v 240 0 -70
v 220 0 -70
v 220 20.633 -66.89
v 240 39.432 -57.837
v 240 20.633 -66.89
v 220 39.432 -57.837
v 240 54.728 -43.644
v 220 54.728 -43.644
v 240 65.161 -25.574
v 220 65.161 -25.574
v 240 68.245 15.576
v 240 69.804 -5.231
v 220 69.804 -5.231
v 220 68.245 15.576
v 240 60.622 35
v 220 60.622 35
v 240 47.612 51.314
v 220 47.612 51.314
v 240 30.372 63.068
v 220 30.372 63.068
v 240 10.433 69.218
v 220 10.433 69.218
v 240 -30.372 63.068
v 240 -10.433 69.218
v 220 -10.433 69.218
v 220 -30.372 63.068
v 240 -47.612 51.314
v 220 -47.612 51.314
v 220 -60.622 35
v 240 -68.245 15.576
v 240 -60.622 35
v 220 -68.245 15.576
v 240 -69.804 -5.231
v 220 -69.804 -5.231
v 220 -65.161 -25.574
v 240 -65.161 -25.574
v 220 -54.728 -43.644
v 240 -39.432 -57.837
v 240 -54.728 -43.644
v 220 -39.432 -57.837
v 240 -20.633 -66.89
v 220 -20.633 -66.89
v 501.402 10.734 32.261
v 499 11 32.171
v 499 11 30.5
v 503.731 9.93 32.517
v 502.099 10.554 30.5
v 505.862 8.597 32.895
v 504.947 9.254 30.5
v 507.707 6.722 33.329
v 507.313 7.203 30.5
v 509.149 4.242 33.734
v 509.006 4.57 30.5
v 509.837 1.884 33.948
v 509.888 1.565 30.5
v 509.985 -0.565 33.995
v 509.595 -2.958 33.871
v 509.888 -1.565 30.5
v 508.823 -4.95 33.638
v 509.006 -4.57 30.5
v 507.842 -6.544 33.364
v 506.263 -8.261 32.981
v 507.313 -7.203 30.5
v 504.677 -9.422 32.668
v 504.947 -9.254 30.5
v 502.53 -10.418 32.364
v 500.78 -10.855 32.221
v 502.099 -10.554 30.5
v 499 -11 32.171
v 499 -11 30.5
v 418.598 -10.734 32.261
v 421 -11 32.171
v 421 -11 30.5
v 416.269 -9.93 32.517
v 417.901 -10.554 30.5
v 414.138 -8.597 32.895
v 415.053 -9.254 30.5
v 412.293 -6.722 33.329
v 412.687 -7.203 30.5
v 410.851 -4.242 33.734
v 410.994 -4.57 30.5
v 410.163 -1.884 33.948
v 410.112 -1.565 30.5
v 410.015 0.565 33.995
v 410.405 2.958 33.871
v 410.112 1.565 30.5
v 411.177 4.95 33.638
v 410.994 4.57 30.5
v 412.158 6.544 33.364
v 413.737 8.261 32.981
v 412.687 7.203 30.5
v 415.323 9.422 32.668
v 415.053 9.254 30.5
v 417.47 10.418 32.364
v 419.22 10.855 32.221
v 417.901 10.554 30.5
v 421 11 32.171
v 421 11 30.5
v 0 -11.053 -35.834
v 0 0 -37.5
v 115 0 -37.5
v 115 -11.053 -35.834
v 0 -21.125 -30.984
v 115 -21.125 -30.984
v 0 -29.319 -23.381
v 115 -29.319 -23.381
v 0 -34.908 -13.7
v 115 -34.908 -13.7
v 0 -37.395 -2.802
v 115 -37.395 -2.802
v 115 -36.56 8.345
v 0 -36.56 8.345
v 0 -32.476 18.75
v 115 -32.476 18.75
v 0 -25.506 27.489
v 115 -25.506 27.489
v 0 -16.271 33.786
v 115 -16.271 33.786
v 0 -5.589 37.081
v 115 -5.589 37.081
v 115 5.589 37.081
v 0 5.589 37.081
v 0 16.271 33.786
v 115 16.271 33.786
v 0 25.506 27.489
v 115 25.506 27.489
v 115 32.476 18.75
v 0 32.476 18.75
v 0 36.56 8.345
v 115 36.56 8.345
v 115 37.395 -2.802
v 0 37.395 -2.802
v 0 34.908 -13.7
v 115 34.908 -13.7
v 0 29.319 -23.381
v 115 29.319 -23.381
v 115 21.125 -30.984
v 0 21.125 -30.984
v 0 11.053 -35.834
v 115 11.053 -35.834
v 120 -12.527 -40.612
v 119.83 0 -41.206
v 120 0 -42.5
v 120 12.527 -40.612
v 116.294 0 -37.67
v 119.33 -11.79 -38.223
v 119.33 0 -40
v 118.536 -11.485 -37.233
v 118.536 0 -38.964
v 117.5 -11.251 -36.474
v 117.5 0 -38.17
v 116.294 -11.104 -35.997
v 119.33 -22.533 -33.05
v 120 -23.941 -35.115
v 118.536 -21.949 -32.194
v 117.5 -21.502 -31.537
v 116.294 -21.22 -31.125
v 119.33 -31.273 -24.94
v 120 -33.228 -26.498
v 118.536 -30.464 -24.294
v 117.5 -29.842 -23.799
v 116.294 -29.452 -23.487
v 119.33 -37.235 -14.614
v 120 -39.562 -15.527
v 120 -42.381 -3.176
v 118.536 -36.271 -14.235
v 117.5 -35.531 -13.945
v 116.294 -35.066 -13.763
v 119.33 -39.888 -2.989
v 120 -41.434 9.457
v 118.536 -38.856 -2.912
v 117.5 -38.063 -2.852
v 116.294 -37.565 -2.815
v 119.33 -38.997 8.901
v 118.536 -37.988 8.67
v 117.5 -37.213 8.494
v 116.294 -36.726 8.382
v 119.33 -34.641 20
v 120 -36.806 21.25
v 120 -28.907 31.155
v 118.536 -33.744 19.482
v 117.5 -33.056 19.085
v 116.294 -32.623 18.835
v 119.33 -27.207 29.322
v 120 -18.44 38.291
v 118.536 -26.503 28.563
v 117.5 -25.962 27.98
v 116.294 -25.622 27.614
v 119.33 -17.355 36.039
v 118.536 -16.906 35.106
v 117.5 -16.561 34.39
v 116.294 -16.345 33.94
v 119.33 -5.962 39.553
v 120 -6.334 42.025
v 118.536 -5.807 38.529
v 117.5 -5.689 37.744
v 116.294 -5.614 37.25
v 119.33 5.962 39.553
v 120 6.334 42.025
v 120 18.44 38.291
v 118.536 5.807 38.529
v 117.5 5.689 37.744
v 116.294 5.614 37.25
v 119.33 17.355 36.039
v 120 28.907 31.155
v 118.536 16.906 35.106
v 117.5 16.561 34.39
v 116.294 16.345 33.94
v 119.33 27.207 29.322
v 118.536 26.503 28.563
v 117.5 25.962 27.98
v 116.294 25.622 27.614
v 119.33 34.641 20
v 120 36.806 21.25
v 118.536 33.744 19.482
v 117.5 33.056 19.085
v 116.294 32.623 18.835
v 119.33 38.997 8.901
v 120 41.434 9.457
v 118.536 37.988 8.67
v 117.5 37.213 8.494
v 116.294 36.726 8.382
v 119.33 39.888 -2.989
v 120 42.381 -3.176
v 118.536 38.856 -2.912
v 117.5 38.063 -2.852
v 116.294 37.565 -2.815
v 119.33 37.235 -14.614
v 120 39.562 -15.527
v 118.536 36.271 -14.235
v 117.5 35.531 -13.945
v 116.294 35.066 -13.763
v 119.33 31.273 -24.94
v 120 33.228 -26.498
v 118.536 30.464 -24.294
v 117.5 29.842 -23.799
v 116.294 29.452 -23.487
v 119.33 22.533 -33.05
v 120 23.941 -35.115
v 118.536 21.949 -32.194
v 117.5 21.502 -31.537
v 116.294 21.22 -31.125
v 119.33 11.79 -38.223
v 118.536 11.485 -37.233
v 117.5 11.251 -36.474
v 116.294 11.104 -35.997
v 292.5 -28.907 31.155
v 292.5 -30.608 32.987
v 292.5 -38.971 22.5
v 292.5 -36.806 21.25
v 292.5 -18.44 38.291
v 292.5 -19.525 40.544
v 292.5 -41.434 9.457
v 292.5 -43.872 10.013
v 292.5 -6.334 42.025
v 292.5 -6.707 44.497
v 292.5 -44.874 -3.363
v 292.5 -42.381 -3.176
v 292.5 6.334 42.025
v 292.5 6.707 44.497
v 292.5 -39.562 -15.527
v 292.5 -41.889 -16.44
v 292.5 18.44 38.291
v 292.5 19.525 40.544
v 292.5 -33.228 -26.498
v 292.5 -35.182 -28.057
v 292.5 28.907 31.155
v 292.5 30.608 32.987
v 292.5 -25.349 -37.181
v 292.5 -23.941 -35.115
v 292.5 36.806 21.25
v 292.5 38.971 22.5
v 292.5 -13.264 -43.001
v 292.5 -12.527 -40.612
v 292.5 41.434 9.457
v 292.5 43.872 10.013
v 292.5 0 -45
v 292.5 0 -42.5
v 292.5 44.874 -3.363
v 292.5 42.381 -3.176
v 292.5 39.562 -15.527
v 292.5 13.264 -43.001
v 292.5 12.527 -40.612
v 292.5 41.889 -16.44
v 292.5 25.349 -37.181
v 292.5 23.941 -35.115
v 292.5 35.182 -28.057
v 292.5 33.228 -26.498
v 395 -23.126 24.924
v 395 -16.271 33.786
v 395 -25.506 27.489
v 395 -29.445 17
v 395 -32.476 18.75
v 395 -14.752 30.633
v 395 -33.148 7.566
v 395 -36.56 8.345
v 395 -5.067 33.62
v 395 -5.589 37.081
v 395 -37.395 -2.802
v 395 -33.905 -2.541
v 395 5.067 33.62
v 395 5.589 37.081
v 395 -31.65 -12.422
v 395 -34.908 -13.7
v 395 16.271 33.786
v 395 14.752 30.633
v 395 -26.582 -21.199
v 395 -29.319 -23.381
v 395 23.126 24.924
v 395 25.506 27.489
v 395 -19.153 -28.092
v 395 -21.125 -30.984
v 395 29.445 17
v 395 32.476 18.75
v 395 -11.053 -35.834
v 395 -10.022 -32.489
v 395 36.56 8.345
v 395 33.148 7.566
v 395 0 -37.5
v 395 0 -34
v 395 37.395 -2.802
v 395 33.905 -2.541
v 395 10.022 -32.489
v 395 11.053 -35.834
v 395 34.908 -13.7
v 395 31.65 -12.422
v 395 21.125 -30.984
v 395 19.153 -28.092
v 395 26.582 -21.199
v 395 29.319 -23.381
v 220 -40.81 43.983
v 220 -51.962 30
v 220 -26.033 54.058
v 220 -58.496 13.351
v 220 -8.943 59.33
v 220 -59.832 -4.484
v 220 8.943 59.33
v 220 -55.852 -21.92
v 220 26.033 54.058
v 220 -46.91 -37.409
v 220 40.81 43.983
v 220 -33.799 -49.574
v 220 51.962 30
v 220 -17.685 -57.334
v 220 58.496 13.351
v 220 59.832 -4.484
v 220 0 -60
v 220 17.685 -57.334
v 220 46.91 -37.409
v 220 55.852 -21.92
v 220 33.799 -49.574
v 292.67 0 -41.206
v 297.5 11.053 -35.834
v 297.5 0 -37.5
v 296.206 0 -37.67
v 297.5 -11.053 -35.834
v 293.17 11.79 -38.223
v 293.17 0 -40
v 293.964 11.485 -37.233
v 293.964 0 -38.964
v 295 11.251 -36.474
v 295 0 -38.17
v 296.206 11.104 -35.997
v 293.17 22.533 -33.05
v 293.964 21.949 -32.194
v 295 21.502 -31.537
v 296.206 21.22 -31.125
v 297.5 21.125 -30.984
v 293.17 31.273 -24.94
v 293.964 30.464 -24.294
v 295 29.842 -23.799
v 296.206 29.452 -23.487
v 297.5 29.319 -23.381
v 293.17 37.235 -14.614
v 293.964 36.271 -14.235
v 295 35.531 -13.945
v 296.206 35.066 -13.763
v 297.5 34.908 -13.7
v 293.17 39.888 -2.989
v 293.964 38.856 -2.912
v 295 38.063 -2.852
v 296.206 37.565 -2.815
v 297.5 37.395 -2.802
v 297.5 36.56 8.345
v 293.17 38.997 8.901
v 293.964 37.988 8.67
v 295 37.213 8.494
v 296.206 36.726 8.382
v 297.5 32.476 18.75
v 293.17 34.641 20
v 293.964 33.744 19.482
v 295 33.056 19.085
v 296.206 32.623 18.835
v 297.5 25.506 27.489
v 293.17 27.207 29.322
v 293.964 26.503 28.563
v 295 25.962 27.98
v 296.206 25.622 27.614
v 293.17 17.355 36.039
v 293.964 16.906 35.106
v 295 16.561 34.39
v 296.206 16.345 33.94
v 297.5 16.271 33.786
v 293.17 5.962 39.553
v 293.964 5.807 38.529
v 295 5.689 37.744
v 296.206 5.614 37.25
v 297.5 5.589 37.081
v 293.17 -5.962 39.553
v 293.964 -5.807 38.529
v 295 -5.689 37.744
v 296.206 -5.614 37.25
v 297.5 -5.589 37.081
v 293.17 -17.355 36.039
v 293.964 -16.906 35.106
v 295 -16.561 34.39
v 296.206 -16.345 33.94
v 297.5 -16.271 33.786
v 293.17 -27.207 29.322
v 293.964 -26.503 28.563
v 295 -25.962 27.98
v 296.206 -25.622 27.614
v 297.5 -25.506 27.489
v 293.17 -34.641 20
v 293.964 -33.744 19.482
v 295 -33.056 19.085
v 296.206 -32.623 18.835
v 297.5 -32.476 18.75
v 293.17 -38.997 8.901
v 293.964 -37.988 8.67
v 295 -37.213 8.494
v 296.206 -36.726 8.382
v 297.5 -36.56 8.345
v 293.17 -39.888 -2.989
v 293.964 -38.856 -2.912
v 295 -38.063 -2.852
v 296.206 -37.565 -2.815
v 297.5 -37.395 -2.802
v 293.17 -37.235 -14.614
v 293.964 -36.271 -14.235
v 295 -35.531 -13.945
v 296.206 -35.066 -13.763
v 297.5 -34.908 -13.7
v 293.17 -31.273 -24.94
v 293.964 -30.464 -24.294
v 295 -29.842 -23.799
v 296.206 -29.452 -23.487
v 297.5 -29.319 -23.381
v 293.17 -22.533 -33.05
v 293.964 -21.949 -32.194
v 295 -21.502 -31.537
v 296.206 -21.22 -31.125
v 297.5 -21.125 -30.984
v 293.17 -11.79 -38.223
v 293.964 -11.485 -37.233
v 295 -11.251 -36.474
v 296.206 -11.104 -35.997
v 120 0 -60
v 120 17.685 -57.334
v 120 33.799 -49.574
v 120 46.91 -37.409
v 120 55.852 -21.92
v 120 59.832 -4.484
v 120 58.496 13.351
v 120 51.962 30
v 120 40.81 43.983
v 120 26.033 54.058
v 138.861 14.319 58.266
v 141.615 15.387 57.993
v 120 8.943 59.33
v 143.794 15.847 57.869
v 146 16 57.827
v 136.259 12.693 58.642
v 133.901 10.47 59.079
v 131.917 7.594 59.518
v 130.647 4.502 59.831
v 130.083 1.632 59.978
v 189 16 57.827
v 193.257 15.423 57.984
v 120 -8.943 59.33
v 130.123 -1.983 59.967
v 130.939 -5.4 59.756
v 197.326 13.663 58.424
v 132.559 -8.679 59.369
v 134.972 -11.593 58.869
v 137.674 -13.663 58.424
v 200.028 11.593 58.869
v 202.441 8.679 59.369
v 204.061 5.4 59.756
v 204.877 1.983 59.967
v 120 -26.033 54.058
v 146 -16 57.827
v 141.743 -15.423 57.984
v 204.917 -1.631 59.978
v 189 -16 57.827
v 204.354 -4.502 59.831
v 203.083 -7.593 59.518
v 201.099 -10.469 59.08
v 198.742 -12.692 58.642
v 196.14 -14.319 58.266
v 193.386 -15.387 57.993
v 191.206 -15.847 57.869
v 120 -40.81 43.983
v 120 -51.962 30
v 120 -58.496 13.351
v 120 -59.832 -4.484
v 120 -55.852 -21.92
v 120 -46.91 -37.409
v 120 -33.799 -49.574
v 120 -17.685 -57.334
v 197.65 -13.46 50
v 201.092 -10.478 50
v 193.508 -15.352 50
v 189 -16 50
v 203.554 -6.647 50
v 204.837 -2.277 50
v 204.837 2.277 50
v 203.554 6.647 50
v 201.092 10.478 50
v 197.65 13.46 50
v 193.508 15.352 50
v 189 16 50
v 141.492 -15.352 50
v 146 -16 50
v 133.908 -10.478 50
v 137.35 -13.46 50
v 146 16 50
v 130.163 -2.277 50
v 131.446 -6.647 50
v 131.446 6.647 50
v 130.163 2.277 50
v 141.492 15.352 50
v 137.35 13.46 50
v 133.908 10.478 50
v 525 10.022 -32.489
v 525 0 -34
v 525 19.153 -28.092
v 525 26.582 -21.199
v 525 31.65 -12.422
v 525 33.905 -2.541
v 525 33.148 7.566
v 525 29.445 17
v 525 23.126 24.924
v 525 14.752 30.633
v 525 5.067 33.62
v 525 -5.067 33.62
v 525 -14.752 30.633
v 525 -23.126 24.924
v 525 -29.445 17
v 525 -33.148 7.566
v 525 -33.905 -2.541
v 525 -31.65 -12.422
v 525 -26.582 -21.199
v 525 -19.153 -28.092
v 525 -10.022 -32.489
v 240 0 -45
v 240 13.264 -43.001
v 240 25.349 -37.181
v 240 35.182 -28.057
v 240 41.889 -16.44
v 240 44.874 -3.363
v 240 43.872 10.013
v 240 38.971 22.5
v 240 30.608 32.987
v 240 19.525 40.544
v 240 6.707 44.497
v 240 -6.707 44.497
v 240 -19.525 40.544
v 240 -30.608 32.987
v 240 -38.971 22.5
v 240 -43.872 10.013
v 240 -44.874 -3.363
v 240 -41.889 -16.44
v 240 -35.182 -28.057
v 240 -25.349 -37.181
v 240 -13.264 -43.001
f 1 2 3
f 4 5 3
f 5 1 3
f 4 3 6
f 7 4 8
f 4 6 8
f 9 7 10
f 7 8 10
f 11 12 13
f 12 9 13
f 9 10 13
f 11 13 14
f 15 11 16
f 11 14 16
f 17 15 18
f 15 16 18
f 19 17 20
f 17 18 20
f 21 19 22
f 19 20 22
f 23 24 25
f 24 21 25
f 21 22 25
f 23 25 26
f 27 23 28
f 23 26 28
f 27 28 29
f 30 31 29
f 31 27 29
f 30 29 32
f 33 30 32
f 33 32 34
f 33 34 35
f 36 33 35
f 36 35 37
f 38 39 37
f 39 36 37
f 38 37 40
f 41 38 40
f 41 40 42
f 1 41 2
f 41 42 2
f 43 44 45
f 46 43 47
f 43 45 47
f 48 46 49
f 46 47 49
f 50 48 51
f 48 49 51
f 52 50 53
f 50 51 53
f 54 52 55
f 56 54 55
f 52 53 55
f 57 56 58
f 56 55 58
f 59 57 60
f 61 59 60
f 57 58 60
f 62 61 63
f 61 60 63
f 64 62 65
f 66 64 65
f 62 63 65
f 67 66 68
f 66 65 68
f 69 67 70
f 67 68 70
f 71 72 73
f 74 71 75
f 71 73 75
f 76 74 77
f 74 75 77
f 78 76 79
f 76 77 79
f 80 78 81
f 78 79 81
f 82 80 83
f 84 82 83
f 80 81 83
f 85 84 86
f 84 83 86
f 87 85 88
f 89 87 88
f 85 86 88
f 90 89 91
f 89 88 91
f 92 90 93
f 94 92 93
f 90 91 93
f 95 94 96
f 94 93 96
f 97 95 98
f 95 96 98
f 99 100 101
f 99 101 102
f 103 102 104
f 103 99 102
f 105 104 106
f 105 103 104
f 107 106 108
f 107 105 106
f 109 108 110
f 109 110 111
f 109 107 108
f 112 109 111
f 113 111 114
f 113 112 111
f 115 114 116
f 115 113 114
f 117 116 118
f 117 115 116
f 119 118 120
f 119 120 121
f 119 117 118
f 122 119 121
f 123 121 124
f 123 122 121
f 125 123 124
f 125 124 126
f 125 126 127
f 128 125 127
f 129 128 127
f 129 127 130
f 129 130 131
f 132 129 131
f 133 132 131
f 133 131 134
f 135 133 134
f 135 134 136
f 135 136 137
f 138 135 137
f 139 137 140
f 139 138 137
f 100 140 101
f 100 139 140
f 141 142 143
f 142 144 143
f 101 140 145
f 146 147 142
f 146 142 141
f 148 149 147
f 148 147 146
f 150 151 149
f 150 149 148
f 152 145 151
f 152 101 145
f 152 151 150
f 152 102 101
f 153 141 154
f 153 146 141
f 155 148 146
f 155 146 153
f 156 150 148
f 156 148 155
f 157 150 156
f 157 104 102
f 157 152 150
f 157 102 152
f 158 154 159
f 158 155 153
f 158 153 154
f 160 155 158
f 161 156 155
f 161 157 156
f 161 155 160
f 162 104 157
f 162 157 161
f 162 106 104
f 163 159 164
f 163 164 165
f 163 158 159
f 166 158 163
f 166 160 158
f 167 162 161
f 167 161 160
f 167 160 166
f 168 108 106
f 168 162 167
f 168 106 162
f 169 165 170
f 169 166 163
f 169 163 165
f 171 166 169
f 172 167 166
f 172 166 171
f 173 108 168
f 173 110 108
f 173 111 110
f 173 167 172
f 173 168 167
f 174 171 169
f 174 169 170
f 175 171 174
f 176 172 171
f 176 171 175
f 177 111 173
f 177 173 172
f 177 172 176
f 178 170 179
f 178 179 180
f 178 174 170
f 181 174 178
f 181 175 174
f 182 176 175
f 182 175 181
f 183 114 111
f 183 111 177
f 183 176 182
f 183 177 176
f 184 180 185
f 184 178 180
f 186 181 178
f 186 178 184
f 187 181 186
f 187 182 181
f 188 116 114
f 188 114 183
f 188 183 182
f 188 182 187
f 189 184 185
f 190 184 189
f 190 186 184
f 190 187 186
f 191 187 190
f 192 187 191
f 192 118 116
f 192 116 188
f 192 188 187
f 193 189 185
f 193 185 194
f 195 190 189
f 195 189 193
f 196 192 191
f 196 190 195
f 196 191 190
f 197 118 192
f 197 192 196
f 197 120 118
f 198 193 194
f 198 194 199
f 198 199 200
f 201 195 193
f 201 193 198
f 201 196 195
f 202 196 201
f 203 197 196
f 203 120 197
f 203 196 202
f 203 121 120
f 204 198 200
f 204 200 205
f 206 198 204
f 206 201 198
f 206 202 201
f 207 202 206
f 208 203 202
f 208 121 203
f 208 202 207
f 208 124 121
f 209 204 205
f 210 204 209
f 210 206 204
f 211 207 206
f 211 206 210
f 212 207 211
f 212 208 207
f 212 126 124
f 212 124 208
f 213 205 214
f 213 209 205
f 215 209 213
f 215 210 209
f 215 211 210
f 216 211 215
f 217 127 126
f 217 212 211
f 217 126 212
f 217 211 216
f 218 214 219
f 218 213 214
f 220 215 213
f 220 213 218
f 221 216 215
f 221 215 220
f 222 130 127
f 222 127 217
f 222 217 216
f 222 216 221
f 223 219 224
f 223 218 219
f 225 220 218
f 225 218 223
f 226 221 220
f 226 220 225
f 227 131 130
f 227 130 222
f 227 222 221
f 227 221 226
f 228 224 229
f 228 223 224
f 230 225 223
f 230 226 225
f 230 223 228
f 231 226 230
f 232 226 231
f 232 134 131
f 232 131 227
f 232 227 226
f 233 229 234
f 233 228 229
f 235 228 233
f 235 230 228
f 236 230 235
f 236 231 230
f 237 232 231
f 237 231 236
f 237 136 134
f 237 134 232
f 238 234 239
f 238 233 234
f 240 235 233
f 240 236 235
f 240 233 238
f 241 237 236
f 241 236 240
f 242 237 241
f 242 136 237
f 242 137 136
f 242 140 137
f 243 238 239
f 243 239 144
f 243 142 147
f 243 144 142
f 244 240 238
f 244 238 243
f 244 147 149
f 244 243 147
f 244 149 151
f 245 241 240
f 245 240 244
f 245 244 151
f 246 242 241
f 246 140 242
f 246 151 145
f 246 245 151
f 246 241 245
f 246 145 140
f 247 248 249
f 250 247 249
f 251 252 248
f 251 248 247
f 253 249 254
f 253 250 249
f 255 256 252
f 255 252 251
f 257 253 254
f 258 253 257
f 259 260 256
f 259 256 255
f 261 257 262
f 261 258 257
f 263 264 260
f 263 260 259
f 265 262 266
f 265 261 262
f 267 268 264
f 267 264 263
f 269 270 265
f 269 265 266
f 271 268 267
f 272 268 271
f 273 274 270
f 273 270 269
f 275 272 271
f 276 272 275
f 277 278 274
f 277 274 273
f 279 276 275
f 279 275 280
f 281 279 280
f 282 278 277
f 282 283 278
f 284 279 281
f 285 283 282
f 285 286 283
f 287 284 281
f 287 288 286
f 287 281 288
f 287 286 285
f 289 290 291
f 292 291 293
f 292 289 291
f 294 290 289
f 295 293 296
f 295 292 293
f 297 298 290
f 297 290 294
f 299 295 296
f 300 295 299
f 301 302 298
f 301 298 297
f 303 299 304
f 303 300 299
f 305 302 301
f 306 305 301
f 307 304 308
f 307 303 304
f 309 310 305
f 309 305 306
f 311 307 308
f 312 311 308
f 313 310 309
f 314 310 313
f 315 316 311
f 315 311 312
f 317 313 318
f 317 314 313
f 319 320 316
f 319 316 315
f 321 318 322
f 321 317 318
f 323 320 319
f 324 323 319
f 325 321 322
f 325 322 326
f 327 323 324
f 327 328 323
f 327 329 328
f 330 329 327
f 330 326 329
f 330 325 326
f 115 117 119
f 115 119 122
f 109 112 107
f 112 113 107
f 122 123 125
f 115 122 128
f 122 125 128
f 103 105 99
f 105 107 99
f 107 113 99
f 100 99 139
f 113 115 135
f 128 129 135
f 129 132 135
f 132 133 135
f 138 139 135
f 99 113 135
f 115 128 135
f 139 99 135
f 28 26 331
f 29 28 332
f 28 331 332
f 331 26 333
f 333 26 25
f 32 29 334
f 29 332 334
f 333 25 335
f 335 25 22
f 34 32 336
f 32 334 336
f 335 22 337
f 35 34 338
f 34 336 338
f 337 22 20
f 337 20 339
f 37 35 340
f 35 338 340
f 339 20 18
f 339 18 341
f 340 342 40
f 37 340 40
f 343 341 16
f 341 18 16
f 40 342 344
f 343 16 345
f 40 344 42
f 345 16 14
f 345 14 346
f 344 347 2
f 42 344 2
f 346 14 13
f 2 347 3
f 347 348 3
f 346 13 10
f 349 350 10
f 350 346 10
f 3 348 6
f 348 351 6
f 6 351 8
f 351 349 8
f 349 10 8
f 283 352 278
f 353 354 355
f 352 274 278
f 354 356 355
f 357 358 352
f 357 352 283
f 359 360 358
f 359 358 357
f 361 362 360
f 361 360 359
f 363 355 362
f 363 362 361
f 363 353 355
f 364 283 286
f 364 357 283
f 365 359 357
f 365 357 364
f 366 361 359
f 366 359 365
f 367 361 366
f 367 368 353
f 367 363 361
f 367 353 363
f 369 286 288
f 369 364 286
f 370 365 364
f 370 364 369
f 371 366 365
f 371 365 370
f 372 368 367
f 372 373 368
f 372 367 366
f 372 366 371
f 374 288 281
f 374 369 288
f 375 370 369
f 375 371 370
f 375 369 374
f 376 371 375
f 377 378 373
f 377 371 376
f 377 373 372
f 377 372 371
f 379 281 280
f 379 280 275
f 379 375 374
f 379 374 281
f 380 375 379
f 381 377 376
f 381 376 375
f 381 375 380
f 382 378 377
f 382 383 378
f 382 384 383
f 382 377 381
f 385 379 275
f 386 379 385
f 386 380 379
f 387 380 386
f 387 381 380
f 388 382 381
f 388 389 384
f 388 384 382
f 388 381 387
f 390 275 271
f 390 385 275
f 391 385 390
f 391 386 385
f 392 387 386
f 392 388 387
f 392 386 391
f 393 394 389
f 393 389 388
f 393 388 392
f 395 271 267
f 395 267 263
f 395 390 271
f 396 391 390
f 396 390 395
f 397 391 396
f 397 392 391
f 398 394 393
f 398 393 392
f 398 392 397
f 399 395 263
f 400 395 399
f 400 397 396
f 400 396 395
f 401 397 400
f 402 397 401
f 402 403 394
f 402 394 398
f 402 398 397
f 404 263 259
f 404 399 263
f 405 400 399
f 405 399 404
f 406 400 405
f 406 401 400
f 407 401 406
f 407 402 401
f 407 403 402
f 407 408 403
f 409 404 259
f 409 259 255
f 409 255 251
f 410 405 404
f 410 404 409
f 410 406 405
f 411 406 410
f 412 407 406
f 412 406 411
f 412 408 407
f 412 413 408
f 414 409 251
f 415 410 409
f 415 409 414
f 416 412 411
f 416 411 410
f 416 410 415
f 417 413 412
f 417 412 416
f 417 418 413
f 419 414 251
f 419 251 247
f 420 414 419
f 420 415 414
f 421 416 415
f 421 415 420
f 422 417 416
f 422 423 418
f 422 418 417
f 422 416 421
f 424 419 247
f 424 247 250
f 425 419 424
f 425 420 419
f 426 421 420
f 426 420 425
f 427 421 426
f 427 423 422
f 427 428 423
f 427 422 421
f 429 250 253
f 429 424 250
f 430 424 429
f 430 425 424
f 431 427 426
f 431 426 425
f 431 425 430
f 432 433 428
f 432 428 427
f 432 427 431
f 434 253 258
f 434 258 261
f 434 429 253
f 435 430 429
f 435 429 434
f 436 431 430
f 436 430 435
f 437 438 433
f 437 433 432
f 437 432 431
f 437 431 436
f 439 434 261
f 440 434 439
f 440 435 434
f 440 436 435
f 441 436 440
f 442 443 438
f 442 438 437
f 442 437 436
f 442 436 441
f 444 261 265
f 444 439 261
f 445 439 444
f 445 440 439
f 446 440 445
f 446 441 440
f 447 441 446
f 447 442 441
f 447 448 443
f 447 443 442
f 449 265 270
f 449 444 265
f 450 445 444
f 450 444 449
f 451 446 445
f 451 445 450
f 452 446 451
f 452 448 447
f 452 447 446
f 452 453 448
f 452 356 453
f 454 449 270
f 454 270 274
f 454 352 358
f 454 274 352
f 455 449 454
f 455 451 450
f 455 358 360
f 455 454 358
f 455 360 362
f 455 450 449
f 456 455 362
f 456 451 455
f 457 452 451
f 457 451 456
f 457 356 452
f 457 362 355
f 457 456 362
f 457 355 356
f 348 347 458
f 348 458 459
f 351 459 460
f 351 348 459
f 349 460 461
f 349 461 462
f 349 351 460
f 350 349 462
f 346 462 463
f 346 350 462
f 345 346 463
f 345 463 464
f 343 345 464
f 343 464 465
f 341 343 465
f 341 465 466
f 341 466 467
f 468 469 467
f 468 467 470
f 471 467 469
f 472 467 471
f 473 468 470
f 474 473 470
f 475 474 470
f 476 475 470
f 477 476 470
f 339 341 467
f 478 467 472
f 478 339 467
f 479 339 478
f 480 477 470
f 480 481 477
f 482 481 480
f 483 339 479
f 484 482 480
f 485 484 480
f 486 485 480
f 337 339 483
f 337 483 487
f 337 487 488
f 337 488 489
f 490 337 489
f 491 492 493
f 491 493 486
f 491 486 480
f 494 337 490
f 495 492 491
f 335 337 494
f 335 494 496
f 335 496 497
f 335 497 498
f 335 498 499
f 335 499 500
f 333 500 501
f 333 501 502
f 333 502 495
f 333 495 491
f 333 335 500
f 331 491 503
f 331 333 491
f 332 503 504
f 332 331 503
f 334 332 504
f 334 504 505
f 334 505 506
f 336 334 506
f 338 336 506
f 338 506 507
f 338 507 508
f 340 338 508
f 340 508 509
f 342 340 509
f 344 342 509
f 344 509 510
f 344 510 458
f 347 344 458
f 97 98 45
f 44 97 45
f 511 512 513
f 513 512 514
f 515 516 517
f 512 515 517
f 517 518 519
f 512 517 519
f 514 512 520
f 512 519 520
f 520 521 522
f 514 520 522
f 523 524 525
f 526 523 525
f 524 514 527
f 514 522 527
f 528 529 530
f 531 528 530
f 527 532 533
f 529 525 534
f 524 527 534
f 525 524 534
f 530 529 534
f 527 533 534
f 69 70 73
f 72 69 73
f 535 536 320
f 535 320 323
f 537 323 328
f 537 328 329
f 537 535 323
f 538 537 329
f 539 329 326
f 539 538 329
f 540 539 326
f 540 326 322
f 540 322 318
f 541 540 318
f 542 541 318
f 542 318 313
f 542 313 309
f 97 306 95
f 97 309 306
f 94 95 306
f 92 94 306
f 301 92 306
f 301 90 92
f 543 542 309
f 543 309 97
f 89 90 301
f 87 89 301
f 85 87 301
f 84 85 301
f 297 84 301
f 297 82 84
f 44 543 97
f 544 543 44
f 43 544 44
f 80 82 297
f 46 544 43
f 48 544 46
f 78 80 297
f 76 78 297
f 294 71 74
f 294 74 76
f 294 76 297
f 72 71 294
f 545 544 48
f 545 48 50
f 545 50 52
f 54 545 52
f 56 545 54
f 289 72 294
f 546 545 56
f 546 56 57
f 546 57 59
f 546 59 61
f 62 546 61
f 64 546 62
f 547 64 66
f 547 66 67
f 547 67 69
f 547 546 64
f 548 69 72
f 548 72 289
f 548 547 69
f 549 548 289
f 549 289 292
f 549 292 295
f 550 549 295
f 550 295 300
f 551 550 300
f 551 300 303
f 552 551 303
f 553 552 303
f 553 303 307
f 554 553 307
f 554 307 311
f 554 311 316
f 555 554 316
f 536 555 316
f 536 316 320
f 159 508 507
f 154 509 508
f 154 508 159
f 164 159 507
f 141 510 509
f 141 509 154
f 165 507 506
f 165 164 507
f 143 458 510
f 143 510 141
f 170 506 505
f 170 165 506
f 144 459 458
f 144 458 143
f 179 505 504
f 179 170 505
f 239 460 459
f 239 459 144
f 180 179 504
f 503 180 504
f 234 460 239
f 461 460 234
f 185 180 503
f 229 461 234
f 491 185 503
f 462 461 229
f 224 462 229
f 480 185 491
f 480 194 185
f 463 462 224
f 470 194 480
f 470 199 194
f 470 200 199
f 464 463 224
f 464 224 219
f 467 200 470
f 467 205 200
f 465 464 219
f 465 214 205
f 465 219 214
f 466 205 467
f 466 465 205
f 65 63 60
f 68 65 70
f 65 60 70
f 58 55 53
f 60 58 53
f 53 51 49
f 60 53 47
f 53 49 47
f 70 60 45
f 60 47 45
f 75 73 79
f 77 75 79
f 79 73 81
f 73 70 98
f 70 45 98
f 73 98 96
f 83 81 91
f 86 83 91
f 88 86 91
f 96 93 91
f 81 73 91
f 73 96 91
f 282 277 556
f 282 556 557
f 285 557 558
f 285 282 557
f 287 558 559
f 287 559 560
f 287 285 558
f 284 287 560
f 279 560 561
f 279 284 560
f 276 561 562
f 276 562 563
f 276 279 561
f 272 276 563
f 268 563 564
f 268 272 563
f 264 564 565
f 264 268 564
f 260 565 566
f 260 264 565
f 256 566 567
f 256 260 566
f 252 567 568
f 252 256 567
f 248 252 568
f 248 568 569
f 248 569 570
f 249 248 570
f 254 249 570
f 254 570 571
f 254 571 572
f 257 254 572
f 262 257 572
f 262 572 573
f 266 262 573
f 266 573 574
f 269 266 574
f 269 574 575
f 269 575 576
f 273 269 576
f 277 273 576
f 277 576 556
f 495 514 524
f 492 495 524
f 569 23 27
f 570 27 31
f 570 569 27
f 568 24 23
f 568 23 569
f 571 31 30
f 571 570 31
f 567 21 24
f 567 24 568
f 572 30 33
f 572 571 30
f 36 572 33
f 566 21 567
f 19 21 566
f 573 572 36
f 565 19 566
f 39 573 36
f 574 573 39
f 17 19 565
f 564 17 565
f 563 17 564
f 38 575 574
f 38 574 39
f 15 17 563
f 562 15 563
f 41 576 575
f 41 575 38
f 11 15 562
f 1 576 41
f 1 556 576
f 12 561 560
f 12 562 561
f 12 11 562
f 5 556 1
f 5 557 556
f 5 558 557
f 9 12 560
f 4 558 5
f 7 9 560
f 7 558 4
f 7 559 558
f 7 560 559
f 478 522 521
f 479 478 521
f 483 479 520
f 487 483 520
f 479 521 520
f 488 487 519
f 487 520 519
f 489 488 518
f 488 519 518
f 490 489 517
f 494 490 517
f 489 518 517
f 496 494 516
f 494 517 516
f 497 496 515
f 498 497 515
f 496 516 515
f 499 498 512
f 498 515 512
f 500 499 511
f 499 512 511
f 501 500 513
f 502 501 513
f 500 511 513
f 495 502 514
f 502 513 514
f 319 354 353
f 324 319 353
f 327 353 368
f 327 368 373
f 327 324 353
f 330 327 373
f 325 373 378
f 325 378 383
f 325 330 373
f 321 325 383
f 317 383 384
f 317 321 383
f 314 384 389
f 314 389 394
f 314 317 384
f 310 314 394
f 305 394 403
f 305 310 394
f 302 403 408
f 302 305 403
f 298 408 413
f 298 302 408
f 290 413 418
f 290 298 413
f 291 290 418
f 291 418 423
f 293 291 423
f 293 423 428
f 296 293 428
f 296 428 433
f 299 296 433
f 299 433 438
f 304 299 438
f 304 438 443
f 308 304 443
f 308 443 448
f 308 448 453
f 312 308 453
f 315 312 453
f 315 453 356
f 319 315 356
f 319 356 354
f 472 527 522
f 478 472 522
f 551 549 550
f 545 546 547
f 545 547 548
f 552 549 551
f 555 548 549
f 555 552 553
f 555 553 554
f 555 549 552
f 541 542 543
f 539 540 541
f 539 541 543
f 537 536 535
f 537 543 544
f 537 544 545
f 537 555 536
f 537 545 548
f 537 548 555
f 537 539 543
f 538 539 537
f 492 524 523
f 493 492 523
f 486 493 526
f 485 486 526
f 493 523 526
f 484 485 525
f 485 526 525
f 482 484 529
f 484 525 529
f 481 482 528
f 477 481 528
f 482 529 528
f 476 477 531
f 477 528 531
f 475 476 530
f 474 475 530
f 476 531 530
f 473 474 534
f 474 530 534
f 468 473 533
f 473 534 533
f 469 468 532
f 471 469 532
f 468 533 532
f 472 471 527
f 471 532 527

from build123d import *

# Parameters (mm, degrees)
SKETCH_1_R          = 70
EXTRUDE_1_DEPTH     = 525
SKETCH_2_OUTSIDE_W  = 254.218
SKETCH_2_OUTSIDE_H  = 254.218
SKETCH_2_OUTSIDE_R  = 45
CUT_EXTRUDE_2_DEPTH = 285
CUT_EXTRUDE_START   = -20
SKETCH_3_OUTSIDE_W  = 254.218
SKETCH_3_OUTSIDE_H  = 254.218
SKETCH_3_OUTSIDE_R  = 60
CUT_EXTRUDE_3_DEPTH = 282.703496831
SKETCH_4_OUTSIDE_W  = 254.218
SKETCH_4_OUTSIDE_H  = 254.218
SKETCH_4_OUTSIDE_R  = 37.5
CUT_EXTRUDE_4_DEPTH = 232.5
SKETCH_5_OUTSIDE_W  = 254.218
SKETCH_5_OUTSIDE_H  = 254.218
SKETCH_5_OUTSIDE_R  = 37.5
CUT_EXTRUDE_5_DEPTH = 120
CUT_EXTRUDE_START_2 = 50
CUT_EXTRUDE_6_DEPTH = 485.251813287
SKETCH_8_OUTSIDE_W  = 254.218
SKETCH_8_OUTSIDE_H  = 254.218
SKETCH_8_OUTSIDE_R  = 34
CUT_EXTRUDE_1_DEPTH = 130
CUT_EXTRUDE_START_3 = 30.5
CUT_EXTRUDE_7_DEPTH = 504.751813287
FILLET_1_R          = 5


with BuildPart() as part:
    # 草图1 → 拉伸1 (new body)
    with BuildSketch(Plane(origin=(0, 0, 0), x_dir=(0, 0, -1), z_dir=(1, 0, 0))):
        Circle(SKETCH_1_R)
    extrude(amount=EXTRUDE_1_DEPTH)

    # 草图2 outside → 拉伸2 (cut)
    with BuildSketch(Plane(origin=(525, 0, 0), x_dir=(0, 0, -1), z_dir=(1, 0, 0))):
        Rectangle(SKETCH_2_OUTSIDE_W, SKETCH_2_OUTSIDE_H)
        Circle(SKETCH_2_OUTSIDE_R, mode=Mode.SUBTRACT)
    extrude(amount=-CUT_EXTRUDE_2_DEPTH, mode=Mode.SUBTRACT)

    # 草图3 outside → 拉伸3 (cut, through all)
    with BuildSketch(Plane(origin=(240, 0, 0), x_dir=(0, 0, -1), z_dir=(1, 0, 0)).offset(CUT_EXTRUDE_START)):
        Rectangle(SKETCH_3_OUTSIDE_W, SKETCH_3_OUTSIDE_H)
        Circle(SKETCH_3_OUTSIDE_R, mode=Mode.SUBTRACT)
    extrude(amount=-CUT_EXTRUDE_3_DEPTH, mode=Mode.SUBTRACT)

    # 草图4 outside → 拉伸4 (cut)
    with BuildSketch(Plane(origin=(525, 0, 0), x_dir=(0, 0, -1), z_dir=(1, 0, 0))):
        Rectangle(SKETCH_4_OUTSIDE_W, SKETCH_4_OUTSIDE_H)
        Circle(SKETCH_4_OUTSIDE_R, mode=Mode.SUBTRACT)
    extrude(amount=-CUT_EXTRUDE_4_DEPTH, mode=Mode.SUBTRACT)

    # 草图5 outside → 拉伸5 (cut)
    with BuildSketch(Plane.ZY):
        Rectangle(SKETCH_5_OUTSIDE_W, SKETCH_5_OUTSIDE_H)
        with Locations(Location((0, 0, 0), (0, 0, 180))):
            Circle(SKETCH_5_OUTSIDE_R, mode=Mode.SUBTRACT)
    extrude(amount=-CUT_EXTRUDE_5_DEPTH, mode=Mode.SUBTRACT)

    # 草图6 → 拉伸6 (cut, through all)
    with BuildSketch(Plane.XY.offset(CUT_EXTRUDE_START_2)):
        with BuildLine():
            Line((146, 16), (189, 16))
            ThreePointArc((189, 16), (205, 0), (189, -16))
            Line((189, -16), (146, -16))
            ThreePointArc((146, -16), (130, 0), (146, 16))
        make_face()
    extrude(amount=CUT_EXTRUDE_6_DEPTH, mode=Mode.SUBTRACT)

    # 草图8 outside → 切除-拉伸1 (cut)
    with BuildSketch(Plane(origin=(525, 0, 0), x_dir=(0, 0, -1), z_dir=(1, 0, 0))):
        Rectangle(SKETCH_8_OUTSIDE_W, SKETCH_8_OUTSIDE_H)
        Circle(SKETCH_8_OUTSIDE_R, mode=Mode.SUBTRACT)
    extrude(amount=-CUT_EXTRUDE_1_DEPTH, mode=Mode.SUBTRACT)

    # 草图7 → 拉伸7 (cut, through all)
    with BuildSketch(Plane.XY.offset(CUT_EXTRUDE_START_3)):
        with BuildLine():
            Line((421, 11), (499, 11))
            ThreePointArc((499, 11), (510, 0), (499, -11))
            Line((499, -11), (421, -11))
            ThreePointArc((421, -11), (410, 0), (421, 11))
        make_face()
    extrude(amount=CUT_EXTRUDE_7_DEPTH, mode=Mode.SUBTRACT)

    # 圆角1
    fillet_1_edges = [part.edges().sort_by_distance(p)[0] for p in [
        (292.5, 0, 37.5),
        (120, 0, 37.5),
    ]]
    fillet(fillet_1_edges, radius=FILLET_1_R)


solid = part.part
